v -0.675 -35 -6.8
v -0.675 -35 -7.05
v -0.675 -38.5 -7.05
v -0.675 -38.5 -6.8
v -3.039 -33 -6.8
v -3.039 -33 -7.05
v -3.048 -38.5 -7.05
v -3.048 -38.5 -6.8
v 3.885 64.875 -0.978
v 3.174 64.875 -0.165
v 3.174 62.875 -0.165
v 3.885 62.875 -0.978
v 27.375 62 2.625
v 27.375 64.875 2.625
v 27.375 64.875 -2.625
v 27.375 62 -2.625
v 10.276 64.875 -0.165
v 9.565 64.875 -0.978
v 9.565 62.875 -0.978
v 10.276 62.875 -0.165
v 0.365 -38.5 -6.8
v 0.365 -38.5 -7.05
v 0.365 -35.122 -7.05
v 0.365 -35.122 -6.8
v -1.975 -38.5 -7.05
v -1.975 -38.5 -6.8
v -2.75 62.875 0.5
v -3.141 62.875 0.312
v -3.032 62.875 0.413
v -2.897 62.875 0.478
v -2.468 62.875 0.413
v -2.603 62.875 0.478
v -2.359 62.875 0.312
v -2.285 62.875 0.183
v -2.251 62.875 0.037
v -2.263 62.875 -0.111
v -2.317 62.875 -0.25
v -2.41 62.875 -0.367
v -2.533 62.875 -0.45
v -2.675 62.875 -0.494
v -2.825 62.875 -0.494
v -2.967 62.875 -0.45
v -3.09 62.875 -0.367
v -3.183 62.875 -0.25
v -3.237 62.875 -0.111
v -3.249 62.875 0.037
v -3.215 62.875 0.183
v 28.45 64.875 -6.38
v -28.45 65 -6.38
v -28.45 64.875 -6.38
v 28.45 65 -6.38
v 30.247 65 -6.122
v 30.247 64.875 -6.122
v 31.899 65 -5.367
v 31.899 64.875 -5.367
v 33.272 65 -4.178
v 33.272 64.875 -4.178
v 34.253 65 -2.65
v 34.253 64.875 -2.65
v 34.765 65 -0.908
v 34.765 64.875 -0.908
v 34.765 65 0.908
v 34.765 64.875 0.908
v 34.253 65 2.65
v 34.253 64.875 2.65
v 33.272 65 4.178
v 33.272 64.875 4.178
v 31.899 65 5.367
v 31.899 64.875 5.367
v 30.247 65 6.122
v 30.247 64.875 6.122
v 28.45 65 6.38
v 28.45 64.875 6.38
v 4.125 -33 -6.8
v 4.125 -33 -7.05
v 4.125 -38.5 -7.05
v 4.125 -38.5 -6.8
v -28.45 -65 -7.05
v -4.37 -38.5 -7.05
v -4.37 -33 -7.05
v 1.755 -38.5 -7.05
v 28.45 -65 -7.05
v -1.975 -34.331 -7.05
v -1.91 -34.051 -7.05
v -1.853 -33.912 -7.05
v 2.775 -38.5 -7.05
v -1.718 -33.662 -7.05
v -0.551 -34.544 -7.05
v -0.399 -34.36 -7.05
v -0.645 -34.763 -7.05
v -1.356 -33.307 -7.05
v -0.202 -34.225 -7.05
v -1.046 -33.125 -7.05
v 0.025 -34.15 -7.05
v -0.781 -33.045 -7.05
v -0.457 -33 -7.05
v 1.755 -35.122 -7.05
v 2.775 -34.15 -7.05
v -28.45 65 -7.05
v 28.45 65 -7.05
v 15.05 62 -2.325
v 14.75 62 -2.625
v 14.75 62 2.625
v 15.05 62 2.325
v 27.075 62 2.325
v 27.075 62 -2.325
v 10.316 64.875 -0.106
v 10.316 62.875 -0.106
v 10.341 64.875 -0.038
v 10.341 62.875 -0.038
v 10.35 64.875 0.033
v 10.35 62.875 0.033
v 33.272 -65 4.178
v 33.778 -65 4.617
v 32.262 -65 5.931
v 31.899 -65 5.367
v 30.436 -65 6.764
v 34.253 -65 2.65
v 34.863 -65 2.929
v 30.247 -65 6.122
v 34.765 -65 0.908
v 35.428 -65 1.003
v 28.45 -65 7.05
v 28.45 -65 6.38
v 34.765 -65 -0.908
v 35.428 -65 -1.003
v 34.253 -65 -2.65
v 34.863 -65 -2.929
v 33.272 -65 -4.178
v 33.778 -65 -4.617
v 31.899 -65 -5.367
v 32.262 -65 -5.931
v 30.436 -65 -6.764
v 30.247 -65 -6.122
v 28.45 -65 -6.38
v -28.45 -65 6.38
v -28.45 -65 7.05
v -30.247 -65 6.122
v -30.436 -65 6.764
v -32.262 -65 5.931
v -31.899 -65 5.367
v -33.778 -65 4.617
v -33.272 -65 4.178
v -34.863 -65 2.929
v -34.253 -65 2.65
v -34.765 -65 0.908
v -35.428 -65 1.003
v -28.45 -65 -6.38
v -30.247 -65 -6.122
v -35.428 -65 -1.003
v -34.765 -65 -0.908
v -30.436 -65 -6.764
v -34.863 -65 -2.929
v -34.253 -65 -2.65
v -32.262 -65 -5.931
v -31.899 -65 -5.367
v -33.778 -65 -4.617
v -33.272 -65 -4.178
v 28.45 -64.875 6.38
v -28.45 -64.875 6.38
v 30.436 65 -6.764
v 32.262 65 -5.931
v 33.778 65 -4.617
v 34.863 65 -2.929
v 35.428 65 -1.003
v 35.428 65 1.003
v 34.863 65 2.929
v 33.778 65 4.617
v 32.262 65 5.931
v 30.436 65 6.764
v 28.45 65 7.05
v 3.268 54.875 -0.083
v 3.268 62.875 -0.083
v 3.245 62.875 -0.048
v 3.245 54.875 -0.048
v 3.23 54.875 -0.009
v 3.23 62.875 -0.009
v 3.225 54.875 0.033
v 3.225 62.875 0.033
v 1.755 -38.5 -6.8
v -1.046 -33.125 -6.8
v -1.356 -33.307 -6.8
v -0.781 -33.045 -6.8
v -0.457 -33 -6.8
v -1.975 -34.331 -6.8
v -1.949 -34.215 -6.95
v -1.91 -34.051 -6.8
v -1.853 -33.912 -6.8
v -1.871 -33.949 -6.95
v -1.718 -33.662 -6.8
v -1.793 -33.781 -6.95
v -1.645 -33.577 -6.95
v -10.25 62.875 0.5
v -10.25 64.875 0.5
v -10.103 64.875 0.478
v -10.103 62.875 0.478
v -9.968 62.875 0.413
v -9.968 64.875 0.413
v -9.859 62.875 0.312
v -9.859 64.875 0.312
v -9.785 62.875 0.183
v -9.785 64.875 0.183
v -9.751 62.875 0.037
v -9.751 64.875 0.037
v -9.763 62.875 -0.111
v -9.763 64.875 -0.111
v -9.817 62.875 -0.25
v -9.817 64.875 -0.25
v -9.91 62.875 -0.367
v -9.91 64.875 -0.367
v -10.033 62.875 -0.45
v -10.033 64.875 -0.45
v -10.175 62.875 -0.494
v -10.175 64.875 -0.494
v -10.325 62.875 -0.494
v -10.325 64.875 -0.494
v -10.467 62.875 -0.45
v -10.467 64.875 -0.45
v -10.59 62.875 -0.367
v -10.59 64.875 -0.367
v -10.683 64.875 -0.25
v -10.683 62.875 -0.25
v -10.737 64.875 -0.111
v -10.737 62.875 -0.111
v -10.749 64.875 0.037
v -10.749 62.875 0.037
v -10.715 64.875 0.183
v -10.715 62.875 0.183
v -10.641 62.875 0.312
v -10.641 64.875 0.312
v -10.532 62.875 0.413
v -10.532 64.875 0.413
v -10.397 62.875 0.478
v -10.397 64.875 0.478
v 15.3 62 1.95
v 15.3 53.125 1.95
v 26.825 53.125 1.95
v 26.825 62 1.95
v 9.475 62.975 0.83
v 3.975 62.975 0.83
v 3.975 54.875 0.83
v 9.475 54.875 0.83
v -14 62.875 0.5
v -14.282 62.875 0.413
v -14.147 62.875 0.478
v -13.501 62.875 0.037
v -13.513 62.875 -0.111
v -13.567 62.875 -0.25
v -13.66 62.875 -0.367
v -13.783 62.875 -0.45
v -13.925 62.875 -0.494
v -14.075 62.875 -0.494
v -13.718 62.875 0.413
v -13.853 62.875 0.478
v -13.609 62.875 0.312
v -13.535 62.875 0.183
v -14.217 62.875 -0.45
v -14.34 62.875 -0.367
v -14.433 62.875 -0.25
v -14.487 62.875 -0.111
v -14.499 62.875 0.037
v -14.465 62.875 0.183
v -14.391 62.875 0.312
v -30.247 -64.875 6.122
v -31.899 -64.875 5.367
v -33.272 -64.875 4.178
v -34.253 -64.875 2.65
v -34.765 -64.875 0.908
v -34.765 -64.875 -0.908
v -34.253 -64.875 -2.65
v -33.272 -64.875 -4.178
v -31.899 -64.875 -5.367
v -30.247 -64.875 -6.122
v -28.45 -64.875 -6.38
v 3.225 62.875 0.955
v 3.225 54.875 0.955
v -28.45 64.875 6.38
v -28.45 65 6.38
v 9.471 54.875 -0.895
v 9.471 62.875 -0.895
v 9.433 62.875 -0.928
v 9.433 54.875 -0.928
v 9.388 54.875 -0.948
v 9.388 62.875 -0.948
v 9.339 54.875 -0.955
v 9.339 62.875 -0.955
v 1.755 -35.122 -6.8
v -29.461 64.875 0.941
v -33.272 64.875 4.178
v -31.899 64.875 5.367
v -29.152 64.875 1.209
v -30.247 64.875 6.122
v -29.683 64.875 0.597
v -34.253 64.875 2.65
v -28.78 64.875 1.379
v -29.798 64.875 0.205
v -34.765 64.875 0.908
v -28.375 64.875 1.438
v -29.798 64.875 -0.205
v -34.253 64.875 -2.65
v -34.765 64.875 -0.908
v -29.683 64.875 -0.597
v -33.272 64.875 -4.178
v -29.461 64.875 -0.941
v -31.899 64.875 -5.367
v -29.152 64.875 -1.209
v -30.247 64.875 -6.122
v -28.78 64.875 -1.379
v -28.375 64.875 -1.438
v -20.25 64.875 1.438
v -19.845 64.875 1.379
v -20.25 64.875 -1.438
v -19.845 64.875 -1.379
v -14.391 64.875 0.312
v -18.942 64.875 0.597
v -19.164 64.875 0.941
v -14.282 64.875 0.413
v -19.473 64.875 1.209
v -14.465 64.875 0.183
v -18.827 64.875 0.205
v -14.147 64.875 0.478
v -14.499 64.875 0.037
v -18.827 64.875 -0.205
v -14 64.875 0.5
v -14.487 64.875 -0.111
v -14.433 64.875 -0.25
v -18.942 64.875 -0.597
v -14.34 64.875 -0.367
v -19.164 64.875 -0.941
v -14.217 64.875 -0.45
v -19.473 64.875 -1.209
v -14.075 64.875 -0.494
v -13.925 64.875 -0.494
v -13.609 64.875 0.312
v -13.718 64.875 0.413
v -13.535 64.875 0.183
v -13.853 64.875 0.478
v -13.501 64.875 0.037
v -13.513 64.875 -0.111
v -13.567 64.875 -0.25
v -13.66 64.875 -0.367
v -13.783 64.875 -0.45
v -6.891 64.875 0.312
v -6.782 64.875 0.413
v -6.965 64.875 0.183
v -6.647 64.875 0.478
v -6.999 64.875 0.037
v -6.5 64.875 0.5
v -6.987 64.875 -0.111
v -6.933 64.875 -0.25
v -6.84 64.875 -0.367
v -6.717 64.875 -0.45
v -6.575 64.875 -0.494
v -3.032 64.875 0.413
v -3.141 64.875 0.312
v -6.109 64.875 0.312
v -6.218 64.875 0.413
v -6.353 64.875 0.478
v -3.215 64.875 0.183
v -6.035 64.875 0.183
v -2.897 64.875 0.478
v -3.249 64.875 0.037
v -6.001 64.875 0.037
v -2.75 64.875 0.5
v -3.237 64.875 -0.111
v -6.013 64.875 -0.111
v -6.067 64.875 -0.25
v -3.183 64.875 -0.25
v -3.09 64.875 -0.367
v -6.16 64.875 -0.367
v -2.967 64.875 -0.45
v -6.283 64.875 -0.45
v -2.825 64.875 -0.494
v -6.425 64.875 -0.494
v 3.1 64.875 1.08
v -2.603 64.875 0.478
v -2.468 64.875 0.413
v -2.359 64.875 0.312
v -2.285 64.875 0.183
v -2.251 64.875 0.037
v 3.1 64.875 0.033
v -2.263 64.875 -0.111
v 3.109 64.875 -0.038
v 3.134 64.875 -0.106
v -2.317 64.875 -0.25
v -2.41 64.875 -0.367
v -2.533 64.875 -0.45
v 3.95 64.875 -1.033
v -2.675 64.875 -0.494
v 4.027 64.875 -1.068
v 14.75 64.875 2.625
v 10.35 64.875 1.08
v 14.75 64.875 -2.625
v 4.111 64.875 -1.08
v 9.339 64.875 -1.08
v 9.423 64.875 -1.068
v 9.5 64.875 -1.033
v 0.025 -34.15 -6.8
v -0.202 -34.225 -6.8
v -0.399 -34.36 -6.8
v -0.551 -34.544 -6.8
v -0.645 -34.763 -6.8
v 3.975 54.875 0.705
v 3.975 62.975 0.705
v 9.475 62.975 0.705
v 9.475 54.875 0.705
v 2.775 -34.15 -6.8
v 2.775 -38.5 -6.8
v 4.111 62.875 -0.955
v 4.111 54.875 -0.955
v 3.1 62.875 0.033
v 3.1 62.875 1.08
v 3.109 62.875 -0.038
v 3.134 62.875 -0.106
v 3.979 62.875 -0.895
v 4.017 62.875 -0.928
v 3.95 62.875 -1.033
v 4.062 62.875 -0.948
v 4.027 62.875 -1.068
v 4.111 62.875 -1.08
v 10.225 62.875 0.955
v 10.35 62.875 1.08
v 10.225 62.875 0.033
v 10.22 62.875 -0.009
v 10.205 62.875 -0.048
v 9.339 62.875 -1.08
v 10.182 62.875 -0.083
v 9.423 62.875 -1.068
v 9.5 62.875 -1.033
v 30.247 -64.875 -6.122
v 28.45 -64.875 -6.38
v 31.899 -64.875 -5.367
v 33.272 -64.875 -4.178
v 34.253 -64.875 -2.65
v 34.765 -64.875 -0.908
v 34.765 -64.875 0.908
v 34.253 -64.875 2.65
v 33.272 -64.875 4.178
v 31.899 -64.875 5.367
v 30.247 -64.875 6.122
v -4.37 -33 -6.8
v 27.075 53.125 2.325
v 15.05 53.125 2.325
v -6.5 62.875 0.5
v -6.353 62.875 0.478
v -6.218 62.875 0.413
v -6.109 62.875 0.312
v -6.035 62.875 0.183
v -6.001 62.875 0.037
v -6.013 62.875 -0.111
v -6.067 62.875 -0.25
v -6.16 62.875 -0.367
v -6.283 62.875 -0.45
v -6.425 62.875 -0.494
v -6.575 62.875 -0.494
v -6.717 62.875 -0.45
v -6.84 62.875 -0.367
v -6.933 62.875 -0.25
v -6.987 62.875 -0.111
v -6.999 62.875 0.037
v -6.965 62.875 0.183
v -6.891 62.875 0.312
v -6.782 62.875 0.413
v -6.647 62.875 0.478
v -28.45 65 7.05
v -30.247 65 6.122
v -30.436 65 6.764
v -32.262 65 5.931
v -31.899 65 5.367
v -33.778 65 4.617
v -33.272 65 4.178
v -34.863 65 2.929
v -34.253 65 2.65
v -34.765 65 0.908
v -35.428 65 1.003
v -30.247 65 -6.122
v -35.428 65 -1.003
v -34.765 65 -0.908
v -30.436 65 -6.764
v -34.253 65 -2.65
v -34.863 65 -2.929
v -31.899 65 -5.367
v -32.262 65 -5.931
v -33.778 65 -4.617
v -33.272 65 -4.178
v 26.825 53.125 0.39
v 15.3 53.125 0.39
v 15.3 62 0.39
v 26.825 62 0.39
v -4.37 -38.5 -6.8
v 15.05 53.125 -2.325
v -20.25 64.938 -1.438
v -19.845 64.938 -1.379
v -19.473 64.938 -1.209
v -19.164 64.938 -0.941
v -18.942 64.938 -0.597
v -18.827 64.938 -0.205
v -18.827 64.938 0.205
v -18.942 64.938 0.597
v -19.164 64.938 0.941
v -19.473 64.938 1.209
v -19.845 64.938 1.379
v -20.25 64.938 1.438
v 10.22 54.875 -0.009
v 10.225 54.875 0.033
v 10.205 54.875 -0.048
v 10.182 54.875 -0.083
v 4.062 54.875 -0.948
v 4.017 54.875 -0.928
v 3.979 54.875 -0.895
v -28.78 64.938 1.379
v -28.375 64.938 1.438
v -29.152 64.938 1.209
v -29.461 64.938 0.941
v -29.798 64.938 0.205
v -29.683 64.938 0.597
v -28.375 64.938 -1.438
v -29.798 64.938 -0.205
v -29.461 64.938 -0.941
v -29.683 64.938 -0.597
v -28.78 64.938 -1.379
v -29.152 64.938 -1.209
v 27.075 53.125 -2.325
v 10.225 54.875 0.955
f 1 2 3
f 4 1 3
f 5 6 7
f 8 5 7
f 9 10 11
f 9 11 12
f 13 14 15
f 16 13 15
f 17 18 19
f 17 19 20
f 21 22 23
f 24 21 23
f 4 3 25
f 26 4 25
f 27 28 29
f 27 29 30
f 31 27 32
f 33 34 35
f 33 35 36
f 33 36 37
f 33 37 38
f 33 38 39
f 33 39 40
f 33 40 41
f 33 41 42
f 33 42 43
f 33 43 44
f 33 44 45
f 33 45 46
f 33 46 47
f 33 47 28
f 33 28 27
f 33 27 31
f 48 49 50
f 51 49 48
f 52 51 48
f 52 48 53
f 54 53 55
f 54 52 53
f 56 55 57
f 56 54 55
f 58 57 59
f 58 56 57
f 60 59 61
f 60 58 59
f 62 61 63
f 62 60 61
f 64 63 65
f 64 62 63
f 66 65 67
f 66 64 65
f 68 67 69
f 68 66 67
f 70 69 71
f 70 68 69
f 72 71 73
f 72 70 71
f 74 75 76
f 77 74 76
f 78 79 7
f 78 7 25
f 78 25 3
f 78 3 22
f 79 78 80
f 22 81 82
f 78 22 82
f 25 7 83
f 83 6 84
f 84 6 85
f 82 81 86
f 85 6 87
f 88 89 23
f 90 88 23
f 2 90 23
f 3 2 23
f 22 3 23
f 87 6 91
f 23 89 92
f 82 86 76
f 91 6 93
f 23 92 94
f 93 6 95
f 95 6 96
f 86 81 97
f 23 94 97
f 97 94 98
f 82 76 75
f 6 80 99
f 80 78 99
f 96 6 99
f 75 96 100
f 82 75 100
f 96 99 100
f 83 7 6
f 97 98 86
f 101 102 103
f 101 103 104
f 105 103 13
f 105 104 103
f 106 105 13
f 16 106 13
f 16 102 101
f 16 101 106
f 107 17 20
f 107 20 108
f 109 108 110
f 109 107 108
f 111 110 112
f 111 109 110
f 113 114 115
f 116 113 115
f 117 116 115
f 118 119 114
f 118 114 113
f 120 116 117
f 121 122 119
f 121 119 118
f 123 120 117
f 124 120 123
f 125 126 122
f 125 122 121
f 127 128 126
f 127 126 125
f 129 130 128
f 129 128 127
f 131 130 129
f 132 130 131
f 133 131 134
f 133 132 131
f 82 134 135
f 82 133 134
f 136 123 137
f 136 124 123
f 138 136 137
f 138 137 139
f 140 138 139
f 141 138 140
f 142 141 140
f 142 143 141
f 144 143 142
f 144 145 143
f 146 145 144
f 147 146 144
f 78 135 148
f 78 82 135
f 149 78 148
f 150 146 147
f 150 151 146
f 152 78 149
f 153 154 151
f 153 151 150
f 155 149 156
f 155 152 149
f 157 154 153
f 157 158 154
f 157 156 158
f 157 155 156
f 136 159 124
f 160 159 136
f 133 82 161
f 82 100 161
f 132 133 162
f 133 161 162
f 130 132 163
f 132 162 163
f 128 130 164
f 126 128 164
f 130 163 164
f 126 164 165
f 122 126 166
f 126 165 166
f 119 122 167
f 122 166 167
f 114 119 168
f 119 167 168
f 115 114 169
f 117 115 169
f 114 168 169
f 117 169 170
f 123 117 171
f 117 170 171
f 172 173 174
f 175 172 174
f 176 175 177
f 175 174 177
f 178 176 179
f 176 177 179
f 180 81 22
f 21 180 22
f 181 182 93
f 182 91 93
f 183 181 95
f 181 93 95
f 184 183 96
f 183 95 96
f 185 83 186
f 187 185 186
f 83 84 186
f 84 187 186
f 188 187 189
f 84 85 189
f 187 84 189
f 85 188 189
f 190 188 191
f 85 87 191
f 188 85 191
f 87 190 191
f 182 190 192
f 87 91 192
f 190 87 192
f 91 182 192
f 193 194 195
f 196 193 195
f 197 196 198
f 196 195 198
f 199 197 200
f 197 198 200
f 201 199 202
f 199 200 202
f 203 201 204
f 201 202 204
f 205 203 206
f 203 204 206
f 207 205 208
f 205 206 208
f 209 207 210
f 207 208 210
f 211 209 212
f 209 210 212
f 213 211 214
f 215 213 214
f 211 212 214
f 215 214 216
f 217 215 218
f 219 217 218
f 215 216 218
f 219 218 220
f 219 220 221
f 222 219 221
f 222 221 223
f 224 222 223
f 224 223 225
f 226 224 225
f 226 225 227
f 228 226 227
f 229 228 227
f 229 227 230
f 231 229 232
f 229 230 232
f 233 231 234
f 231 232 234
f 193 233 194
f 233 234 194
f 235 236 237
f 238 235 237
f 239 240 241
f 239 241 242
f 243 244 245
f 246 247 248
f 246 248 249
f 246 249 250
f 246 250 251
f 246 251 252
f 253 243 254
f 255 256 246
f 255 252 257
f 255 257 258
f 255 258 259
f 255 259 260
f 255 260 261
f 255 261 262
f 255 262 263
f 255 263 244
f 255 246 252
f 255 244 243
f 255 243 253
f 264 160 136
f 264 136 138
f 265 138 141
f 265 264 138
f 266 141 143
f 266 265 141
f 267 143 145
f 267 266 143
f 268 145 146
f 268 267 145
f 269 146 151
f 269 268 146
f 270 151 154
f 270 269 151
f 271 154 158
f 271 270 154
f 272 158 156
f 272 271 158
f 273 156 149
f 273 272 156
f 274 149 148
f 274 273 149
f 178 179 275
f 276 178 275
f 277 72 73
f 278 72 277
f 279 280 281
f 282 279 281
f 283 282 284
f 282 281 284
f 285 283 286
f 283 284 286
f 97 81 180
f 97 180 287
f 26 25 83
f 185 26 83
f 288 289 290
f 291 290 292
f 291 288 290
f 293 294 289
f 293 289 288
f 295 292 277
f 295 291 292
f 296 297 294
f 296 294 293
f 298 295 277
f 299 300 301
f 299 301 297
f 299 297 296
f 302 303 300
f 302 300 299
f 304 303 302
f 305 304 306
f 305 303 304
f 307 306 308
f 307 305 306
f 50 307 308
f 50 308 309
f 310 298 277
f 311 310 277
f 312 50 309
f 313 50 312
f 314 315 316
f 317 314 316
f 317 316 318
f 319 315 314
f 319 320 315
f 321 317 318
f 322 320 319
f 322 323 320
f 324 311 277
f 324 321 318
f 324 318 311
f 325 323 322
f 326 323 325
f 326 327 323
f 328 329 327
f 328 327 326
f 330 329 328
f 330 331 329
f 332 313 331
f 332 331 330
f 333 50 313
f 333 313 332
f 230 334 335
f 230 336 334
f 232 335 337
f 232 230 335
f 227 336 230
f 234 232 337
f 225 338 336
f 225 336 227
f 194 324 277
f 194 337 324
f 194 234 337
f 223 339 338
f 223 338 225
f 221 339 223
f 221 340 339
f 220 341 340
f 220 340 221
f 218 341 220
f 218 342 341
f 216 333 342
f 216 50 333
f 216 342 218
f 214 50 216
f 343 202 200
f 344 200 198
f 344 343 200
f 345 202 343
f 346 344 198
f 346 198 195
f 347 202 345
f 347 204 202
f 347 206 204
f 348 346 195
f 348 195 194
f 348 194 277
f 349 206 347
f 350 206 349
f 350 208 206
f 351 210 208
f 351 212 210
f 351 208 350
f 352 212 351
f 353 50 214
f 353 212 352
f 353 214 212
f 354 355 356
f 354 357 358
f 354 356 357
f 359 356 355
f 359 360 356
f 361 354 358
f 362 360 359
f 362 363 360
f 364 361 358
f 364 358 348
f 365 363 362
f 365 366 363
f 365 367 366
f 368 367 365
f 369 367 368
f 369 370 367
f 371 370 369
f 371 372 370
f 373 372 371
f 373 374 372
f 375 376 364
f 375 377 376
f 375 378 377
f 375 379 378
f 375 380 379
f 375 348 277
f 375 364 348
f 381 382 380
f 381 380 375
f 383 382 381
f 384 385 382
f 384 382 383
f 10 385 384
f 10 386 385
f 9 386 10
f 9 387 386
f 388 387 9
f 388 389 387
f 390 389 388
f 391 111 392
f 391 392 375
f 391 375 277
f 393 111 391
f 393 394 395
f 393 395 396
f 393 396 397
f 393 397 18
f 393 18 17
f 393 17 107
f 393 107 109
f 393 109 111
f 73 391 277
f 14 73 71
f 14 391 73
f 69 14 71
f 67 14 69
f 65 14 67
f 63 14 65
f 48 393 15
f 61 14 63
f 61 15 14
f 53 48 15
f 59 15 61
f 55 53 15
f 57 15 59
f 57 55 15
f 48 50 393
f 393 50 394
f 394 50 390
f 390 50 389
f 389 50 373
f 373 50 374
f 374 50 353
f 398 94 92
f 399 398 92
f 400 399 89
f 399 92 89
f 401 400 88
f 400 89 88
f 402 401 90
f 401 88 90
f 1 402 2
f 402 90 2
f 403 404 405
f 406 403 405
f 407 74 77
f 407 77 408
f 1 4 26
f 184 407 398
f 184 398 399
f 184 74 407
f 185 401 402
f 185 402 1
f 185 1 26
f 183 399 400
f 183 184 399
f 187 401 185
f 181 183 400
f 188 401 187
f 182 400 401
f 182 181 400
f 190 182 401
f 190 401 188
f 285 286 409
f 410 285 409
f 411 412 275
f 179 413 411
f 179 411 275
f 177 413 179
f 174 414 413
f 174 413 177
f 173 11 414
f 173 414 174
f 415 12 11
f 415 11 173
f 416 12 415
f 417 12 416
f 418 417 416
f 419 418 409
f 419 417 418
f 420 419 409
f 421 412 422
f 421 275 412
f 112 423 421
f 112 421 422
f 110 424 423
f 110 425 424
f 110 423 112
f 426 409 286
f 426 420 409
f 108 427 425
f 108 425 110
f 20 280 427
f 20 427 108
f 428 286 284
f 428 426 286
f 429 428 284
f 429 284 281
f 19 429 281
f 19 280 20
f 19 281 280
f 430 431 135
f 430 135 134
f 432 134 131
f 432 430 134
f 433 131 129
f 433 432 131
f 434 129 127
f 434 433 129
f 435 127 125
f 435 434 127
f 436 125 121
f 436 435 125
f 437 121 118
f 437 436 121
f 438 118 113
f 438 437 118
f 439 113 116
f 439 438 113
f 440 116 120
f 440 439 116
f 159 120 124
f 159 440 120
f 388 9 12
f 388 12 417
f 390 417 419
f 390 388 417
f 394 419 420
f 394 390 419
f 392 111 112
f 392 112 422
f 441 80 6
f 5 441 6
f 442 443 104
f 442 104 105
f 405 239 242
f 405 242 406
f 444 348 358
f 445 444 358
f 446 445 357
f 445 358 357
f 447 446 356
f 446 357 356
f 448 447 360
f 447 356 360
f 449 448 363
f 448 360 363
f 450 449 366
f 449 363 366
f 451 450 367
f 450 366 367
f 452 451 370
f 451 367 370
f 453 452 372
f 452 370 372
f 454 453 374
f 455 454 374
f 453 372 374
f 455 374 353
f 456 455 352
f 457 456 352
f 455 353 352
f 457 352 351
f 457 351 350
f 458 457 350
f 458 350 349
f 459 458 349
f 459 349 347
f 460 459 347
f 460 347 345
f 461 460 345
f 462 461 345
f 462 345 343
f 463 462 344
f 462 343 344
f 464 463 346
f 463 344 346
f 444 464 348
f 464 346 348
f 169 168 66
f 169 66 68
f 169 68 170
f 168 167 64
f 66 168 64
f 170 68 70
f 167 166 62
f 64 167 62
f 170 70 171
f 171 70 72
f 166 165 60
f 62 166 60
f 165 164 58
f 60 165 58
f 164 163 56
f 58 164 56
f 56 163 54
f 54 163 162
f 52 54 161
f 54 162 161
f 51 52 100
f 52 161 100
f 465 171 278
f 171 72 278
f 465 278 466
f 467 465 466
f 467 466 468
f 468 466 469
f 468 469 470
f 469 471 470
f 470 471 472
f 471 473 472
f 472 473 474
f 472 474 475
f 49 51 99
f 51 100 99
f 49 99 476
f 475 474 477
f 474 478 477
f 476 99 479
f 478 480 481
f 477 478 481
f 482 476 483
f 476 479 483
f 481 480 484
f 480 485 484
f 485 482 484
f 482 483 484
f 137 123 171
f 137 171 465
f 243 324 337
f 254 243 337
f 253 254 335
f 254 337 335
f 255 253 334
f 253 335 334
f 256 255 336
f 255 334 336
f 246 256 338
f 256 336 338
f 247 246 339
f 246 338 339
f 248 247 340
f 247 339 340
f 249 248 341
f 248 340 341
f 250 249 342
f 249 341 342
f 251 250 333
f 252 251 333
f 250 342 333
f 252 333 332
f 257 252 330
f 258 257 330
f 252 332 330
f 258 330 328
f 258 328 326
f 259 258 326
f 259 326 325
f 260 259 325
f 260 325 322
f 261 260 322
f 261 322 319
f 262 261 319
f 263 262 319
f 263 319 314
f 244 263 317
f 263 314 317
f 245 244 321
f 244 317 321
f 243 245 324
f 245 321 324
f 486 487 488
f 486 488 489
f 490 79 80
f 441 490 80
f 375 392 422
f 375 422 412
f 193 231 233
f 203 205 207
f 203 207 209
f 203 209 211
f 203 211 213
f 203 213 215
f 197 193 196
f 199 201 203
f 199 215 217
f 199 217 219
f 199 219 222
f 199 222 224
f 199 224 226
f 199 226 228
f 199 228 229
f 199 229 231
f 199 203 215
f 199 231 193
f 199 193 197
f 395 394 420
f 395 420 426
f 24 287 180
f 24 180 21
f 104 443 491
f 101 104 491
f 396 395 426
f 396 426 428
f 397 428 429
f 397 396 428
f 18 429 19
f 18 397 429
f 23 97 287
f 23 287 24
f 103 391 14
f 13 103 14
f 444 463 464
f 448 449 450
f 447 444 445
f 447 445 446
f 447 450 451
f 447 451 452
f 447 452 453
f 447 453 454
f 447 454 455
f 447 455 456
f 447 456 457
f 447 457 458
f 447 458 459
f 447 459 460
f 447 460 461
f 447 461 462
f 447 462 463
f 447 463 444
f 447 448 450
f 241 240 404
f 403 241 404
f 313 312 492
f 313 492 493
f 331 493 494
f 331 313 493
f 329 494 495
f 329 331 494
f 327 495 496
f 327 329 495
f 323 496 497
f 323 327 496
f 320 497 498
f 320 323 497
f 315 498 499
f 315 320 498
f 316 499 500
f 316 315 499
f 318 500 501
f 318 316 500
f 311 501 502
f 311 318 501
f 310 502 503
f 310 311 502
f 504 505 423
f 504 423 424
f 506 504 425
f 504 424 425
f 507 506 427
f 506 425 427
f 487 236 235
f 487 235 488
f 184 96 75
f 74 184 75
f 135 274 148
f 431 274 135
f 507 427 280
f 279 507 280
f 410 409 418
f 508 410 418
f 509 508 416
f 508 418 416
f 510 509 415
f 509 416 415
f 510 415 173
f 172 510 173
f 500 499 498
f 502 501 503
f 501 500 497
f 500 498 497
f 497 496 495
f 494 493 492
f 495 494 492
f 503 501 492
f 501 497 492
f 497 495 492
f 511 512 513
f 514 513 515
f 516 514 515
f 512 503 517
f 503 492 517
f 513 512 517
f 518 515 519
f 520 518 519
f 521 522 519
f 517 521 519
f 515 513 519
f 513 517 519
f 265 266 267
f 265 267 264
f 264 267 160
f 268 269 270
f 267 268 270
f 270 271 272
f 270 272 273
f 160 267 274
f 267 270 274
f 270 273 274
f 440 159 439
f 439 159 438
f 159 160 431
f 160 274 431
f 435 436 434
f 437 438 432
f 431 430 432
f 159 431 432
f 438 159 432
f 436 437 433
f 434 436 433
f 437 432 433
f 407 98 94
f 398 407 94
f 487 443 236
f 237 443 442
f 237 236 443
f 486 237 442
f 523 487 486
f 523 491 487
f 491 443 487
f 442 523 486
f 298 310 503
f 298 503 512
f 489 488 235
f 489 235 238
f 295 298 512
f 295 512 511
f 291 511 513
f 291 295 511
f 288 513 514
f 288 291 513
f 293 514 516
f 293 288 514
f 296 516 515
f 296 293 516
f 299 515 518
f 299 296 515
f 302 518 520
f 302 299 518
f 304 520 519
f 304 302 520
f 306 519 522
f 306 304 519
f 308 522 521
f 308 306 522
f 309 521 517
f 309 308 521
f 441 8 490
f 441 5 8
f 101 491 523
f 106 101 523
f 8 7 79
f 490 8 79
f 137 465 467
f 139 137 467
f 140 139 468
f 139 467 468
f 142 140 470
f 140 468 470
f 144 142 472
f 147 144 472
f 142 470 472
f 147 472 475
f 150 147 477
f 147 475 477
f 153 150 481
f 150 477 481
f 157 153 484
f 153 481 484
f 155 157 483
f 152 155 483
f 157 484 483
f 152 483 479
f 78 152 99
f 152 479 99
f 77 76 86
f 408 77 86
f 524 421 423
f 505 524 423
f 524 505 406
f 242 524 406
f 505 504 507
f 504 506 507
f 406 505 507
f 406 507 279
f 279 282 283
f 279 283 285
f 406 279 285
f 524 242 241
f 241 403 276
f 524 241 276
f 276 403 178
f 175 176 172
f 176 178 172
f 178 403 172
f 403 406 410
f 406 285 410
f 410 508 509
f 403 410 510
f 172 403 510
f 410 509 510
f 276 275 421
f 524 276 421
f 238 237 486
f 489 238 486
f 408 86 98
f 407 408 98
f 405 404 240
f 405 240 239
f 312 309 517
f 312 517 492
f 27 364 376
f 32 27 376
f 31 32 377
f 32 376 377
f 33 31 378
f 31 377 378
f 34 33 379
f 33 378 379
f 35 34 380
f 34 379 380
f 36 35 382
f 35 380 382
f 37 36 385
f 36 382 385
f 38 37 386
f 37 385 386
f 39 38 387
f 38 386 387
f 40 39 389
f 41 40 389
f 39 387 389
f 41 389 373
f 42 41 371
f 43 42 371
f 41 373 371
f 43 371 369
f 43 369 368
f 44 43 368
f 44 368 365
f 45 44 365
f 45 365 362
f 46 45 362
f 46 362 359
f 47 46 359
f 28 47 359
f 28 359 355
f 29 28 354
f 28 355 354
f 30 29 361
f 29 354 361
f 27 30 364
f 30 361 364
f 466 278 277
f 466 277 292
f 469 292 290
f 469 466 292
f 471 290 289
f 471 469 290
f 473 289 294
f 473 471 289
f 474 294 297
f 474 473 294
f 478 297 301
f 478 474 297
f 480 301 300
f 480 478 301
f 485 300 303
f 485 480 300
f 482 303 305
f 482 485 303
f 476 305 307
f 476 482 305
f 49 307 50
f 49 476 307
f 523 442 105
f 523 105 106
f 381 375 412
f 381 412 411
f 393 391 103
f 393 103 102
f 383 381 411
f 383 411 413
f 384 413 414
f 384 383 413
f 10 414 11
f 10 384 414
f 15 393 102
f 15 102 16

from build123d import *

# Parameters (mm, degrees)
BOSS_EXTRUDE1_DEPTH = 65
BOSS_EXTRUDE2_DEPTH = 129.75
SKETCH5_W           = 1.39
SKETCH5_H           = 3.378
CUT_EXTRUDE1_DEPTH  = 0.25
SKETCH8_R           = 0.5
CUT_EXTRUDE2_DEPTH  = 2
BOSS_EXTRUDE3_DEPTH = 0.0625
SKETCH11_W          = 12.625
SKETCH11_H          = 5.25
CUT_EXTRUDE4_DEPTH  = 11.75
SKETCH12_W          = 12.625
SKETCH12_H          = 5.25
SKETCH12_W_2        = 12.025
SKETCH12_H_2        = 4.65
BOSS_EXTRUDE4_DEPTH = 8.875
SKETCH13_W          = 11.525
SKETCH13_H          = 1.56
BOSS_EXTRUDE5_DEPTH = 8.875
CUT_EXTRUDE5_DEPTH  = 10
SKETCH17_W          = 5.5
SKETCH17_H          = 0.125
BOSS_EXTRUDE6_DEPTH = 8.1
BOSS_EXTRUDE7_START = 8
BOSS_EXTRUDE7_DEPTH = 8


with BuildPart() as part:
    # Sketch1 → Boss-Extrude1 (new, symmetric)
    with BuildSketch(Plane(origin=(0, 0, 0), x_dir=(1, 0, 0), z_dir=(0, 1, 0))):
        with BuildLine():
            Line((-28.45, 7.05), (28.45, 7.05))
            ThreePointArc((28.45, 7.05), (35.5, 0), (28.45, -7.05))
            Line((28.45, -7.05), (-28.45, -7.05))
            ThreePointArc((-28.45, -7.05), (-35.5, 0), (-28.45, 7.05))
        make_face()
        with BuildLine():
            Line((-28.45, 6.38), (28.45, 6.38))
            ThreePointArc((28.45, 6.38), (34.83, 0), (28.45, -6.38))
            Line((28.45, -6.38), (-28.45, -6.38))
            ThreePointArc((-28.45, -6.38), (-34.83, 0), (-28.45, 6.38))
        make_face(mode=Mode.SUBTRACT)
    extrude(amount=BOSS_EXTRUDE1_DEPTH, both=True)

    # Sketch2 → Boss-Extrude2 (add)
    with BuildSketch(Plane(origin=(0, 64.875, 0), x_dir=(1, 0, 0), z_dir=(0, 1, 0))):
        with BuildLine():
            Line((-28.45, -6.38), (28.45, -6.38))
            ThreePointArc((28.45, -6.38), (34.83, 0), (28.45, 6.38))
            Line((28.45, 6.38), (-28.45, 6.38))
            ThreePointArc((-28.45, 6.38), (-34.83, 0), (-28.45, -6.38))
        make_face()
    extrude(amount=-BOSS_EXTRUDE2_DEPTH)

    # Sketch5 → Cut-Extrude1 (cut)
    with BuildSketch(Plane(origin=(0, 0, -7.05), x_dir=(-1, 0, 0), z_dir=(0, 0, -1))):
        Polygon((3.047959184, -38.5), (4.369798182, -38.5), (4.369798182, -33), (3.039285714, -33), align=None)
        with BuildLine():
            Line((-4.125, -33), (-4.125, -38.5))
            Line((-4.125, -38.5), (-2.775, -38.5))
            Line((-2.775, -38.5), (-2.775, -34.15))
            Line((-2.775, -34.15), (-0.025, -34.15))
            ThreePointArc((-0.025, -34.15), (0.481245093, -34.446327571), (0.675, -35))
            Line((0.675, -35), (0.675, -38.5))
            Line((0.675, -38.5), (1.975, -38.5))
            Line((1.975, -38.5), (1.975, -34.330645161))
            add(Edge.make_bspline(
                [(1.975, -34.330645161), (1.946635107, -34.301634388), (1.95702187, -34.248224197), (1.948979592, -34.215322581), (1.924253679, -34.114166856), (1.916519719, -34.042472973), (1.870918367, -33.949193548), (1.843725239, -33.893568896), (1.820050271, -33.836269814), (1.792857143, -33.780645161), (1.758600377, -33.710571549), (1.699108422, -33.633824398), (1.645408163, -33.576612903), (1.280199443, -33.187524707), (1.016815103, -33.047701351), (0.457142857, -33)],
                knots=[0, 0, 0, 0, 1, 1, 1, 2, 2, 2, 3, 3, 3, 4, 4, 4, 5, 5, 5, 5], degree=3))
            Line((0.457142857, -33), (-4.125, -33))
        make_face()
        with Locations((-1.06, -36.811)):
            Rectangle(SKETCH5_W, SKETCH5_H)
    extrude(amount=-CUT_EXTRUDE1_DEPTH, mode=Mode.SUBTRACT)

    # Sketch8 → Cut-Extrude2 (cut)
    with BuildSketch(Plane(origin=(0, 64.875, 0), x_dir=(1, 0, 0), z_dir=(0, 1, 0))):
        with Locations(Location((-14, 0, 0), (0, 0, 270))):
            Circle(SKETCH8_R)
        with Locations(Location((-10.25, 0, 0), (0, 0, 270))):
            Circle(SKETCH8_R)
        with Locations(Location((-6.5, 0, 0), (0, 0, 270))):
            Circle(SKETCH8_R)
        with Locations(Location((-2.75, 0, 0), (0, 0, 270))):
            Circle(SKETCH8_R)
    extrude(amount=-CUT_EXTRUDE2_DEPTH, mode=Mode.SUBTRACT)

    # Sketch9 → Boss-Extrude3 (add)
    with BuildSketch(Plane(origin=(0, 64.875, 0), x_dir=(1, 0, 0), z_dir=(0, 1, 0))):
        with BuildLine():
            Line((-28.375, 1.4375), (-20.25, 1.4375))
            ThreePointArc((-20.25, 1.4375), (-18.8125, 0), (-20.25, -1.4375))
            Line((-20.25, -1.4375), (-28.375, -1.4375))
            ThreePointArc((-28.375, -1.4375), (-29.8125, 0), (-28.375, 1.4375))
        make_face()
    extrude(amount=BOSS_EXTRUDE3_DEPTH)

    # Sketch11 → Cut-Extrude4 (cut)
    with BuildSketch(Plane(origin=(0, 64.875, 0), x_dir=(1, 0, 0), z_dir=(0, 1, 0))):
        with Locations((21.0625, 0)):
            Rectangle(SKETCH11_W, SKETCH11_H)
    extrude(amount=-CUT_EXTRUDE4_DEPTH, mode=Mode.SUBTRACT)

    # Sketch12 → Boss-Extrude4 (add)
    with BuildSketch(Plane(origin=(0, 53.125, 0), x_dir=(1, 0, 0), z_dir=(0, 1, 0))):
        with Locations((21.0625, 0)):
            Rectangle(SKETCH12_W, SKETCH12_H)
        with Locations((21.0625, 0)):
            Rectangle(SKETCH12_W_2, SKETCH12_H_2, mode=Mode.SUBTRACT)
    extrude(amount=BOSS_EXTRUDE4_DEPTH)

    # Sketch13 → Boss-Extrude5 (add)
    with BuildSketch(Plane(origin=(0, 53.125, 0), x_dir=(1, 0, 0), z_dir=(0, 1, 0))):
        with Locations((21.0625, -1.17)):
            Rectangle(SKETCH13_W, SKETCH13_H)
    extrude(amount=BOSS_EXTRUDE5_DEPTH)

    # Sketch16 → Cut-Extrude5 (cut)
    with BuildSketch(Plane(origin=(0, 64.875, 0), x_dir=(1, 0, 0), z_dir=(0, 1, 0))):
        with BuildLine():
            Line((4.111130468, 1.08), (9.338869532, 1.08))
            ThreePointArc((9.338869532, 1.08), (9.462834417, 1.053189874), (9.56464254, 0.977551382))
            Line((9.56464254, 0.977551382), (10.275773008, 0.164830848))
            ThreePointArc((10.275773008, 0.164830848), (10.330830823, 0.072797467), (10.35, -0.032720535))
            Line((10.35, -0.032720535), (10.35, -1.08))
            Line((10.35, -1.08), (3.1, -1.08))
            Line((3.1, -1.08), (3.1, -0.032720535))
            ThreePointArc((3.1, -0.032720535), (3.119169177, 0.072797467), (3.174226992, 0.164830848))
            Line((3.174226992, 0.164830848), (3.88535746, 0.977551382))
            ThreePointArc((3.88535746, 0.977551382), (3.987165583, 1.053189874), (4.111130468, 1.08))
        make_face()
    extrude(amount=-CUT_EXTRUDE5_DEPTH, mode=Mode.SUBTRACT)

    # Sketch17 → Boss-Extrude6 (add)
    with BuildSketch(Plane(origin=(0, 54.875, 0), x_dir=(1, 0, 0), z_dir=(0, 1, 0))):
        with Locations((6.725, -0.7675)):
            Rectangle(SKETCH17_W, SKETCH17_H)
    extrude(amount=BOSS_EXTRUDE6_DEPTH)

    # Sketch18 → Boss-Extrude7 (add)
    with BuildSketch(Plane(origin=(0, 54.875, 0), x_dir=(1, 0, 0), z_dir=(0, 1, 0)).offset(BOSS_EXTRUDE7_START)):
        with BuildLine():
            Line((3.1, -1.08), (10.35, -1.08))
            Line((10.35, -1.08), (10.35, -0.032720535))
            ThreePointArc((10.35, -0.032720535), (10.330830823, 0.072797467), (10.275773008, 0.164830848))
            Line((10.275773008, 0.164830848), (9.56464254, 0.977551382))
            ThreePointArc((9.56464254, 0.977551382), (9.462834417, 1.053189874), (9.338869532, 1.08))
            Line((9.338869532, 1.08), (4.111130468, 1.08))
            ThreePointArc((4.111130468, 1.08), (3.987165583, 1.053189874), (3.88535746, 0.977551382))
            Line((3.88535746, 0.977551382), (3.174226992, 0.164830848))
            ThreePointArc((3.174226992, 0.164830848), (3.119169177, 0.072797467), (3.1, -0.032720535))
            Line((3.1, -0.032720535), (3.1, -1.08))
        make_face()
        with BuildLine():
            Line((3.225, -0.032720535), (3.225, -0.955))
            Line((3.225, -0.955), (10.225, -0.955))
            Line((10.225, -0.955), (10.225, -0.032720535))
            ThreePointArc((10.225, -0.032720535), (10.21381798, 0.028831633), (10.181700922, 0.082517772))
            Line((10.181700922, 0.082517772), (9.470570454, 0.895238306))
            ThreePointArc((9.470570454, 0.895238306), (9.411182381, 0.93936076), (9.338869532, 0.955))
            Line((9.338869532, 0.955), (4.111130468, 0.955))
            ThreePointArc((4.111130468, 0.955), (4.038817619, 0.93936076), (3.979429546, 0.895238306))
            Line((3.979429546, 0.895238306), (3.268299078, 0.082517772))
            ThreePointArc((3.268299078, 0.082517772), (3.23618202, 0.028831633), (3.225, -0.032720535))
        make_face(mode=Mode.SUBTRACT)
    extrude(amount=-BOSS_EXTRUDE7_DEPTH)


solid = part.part
